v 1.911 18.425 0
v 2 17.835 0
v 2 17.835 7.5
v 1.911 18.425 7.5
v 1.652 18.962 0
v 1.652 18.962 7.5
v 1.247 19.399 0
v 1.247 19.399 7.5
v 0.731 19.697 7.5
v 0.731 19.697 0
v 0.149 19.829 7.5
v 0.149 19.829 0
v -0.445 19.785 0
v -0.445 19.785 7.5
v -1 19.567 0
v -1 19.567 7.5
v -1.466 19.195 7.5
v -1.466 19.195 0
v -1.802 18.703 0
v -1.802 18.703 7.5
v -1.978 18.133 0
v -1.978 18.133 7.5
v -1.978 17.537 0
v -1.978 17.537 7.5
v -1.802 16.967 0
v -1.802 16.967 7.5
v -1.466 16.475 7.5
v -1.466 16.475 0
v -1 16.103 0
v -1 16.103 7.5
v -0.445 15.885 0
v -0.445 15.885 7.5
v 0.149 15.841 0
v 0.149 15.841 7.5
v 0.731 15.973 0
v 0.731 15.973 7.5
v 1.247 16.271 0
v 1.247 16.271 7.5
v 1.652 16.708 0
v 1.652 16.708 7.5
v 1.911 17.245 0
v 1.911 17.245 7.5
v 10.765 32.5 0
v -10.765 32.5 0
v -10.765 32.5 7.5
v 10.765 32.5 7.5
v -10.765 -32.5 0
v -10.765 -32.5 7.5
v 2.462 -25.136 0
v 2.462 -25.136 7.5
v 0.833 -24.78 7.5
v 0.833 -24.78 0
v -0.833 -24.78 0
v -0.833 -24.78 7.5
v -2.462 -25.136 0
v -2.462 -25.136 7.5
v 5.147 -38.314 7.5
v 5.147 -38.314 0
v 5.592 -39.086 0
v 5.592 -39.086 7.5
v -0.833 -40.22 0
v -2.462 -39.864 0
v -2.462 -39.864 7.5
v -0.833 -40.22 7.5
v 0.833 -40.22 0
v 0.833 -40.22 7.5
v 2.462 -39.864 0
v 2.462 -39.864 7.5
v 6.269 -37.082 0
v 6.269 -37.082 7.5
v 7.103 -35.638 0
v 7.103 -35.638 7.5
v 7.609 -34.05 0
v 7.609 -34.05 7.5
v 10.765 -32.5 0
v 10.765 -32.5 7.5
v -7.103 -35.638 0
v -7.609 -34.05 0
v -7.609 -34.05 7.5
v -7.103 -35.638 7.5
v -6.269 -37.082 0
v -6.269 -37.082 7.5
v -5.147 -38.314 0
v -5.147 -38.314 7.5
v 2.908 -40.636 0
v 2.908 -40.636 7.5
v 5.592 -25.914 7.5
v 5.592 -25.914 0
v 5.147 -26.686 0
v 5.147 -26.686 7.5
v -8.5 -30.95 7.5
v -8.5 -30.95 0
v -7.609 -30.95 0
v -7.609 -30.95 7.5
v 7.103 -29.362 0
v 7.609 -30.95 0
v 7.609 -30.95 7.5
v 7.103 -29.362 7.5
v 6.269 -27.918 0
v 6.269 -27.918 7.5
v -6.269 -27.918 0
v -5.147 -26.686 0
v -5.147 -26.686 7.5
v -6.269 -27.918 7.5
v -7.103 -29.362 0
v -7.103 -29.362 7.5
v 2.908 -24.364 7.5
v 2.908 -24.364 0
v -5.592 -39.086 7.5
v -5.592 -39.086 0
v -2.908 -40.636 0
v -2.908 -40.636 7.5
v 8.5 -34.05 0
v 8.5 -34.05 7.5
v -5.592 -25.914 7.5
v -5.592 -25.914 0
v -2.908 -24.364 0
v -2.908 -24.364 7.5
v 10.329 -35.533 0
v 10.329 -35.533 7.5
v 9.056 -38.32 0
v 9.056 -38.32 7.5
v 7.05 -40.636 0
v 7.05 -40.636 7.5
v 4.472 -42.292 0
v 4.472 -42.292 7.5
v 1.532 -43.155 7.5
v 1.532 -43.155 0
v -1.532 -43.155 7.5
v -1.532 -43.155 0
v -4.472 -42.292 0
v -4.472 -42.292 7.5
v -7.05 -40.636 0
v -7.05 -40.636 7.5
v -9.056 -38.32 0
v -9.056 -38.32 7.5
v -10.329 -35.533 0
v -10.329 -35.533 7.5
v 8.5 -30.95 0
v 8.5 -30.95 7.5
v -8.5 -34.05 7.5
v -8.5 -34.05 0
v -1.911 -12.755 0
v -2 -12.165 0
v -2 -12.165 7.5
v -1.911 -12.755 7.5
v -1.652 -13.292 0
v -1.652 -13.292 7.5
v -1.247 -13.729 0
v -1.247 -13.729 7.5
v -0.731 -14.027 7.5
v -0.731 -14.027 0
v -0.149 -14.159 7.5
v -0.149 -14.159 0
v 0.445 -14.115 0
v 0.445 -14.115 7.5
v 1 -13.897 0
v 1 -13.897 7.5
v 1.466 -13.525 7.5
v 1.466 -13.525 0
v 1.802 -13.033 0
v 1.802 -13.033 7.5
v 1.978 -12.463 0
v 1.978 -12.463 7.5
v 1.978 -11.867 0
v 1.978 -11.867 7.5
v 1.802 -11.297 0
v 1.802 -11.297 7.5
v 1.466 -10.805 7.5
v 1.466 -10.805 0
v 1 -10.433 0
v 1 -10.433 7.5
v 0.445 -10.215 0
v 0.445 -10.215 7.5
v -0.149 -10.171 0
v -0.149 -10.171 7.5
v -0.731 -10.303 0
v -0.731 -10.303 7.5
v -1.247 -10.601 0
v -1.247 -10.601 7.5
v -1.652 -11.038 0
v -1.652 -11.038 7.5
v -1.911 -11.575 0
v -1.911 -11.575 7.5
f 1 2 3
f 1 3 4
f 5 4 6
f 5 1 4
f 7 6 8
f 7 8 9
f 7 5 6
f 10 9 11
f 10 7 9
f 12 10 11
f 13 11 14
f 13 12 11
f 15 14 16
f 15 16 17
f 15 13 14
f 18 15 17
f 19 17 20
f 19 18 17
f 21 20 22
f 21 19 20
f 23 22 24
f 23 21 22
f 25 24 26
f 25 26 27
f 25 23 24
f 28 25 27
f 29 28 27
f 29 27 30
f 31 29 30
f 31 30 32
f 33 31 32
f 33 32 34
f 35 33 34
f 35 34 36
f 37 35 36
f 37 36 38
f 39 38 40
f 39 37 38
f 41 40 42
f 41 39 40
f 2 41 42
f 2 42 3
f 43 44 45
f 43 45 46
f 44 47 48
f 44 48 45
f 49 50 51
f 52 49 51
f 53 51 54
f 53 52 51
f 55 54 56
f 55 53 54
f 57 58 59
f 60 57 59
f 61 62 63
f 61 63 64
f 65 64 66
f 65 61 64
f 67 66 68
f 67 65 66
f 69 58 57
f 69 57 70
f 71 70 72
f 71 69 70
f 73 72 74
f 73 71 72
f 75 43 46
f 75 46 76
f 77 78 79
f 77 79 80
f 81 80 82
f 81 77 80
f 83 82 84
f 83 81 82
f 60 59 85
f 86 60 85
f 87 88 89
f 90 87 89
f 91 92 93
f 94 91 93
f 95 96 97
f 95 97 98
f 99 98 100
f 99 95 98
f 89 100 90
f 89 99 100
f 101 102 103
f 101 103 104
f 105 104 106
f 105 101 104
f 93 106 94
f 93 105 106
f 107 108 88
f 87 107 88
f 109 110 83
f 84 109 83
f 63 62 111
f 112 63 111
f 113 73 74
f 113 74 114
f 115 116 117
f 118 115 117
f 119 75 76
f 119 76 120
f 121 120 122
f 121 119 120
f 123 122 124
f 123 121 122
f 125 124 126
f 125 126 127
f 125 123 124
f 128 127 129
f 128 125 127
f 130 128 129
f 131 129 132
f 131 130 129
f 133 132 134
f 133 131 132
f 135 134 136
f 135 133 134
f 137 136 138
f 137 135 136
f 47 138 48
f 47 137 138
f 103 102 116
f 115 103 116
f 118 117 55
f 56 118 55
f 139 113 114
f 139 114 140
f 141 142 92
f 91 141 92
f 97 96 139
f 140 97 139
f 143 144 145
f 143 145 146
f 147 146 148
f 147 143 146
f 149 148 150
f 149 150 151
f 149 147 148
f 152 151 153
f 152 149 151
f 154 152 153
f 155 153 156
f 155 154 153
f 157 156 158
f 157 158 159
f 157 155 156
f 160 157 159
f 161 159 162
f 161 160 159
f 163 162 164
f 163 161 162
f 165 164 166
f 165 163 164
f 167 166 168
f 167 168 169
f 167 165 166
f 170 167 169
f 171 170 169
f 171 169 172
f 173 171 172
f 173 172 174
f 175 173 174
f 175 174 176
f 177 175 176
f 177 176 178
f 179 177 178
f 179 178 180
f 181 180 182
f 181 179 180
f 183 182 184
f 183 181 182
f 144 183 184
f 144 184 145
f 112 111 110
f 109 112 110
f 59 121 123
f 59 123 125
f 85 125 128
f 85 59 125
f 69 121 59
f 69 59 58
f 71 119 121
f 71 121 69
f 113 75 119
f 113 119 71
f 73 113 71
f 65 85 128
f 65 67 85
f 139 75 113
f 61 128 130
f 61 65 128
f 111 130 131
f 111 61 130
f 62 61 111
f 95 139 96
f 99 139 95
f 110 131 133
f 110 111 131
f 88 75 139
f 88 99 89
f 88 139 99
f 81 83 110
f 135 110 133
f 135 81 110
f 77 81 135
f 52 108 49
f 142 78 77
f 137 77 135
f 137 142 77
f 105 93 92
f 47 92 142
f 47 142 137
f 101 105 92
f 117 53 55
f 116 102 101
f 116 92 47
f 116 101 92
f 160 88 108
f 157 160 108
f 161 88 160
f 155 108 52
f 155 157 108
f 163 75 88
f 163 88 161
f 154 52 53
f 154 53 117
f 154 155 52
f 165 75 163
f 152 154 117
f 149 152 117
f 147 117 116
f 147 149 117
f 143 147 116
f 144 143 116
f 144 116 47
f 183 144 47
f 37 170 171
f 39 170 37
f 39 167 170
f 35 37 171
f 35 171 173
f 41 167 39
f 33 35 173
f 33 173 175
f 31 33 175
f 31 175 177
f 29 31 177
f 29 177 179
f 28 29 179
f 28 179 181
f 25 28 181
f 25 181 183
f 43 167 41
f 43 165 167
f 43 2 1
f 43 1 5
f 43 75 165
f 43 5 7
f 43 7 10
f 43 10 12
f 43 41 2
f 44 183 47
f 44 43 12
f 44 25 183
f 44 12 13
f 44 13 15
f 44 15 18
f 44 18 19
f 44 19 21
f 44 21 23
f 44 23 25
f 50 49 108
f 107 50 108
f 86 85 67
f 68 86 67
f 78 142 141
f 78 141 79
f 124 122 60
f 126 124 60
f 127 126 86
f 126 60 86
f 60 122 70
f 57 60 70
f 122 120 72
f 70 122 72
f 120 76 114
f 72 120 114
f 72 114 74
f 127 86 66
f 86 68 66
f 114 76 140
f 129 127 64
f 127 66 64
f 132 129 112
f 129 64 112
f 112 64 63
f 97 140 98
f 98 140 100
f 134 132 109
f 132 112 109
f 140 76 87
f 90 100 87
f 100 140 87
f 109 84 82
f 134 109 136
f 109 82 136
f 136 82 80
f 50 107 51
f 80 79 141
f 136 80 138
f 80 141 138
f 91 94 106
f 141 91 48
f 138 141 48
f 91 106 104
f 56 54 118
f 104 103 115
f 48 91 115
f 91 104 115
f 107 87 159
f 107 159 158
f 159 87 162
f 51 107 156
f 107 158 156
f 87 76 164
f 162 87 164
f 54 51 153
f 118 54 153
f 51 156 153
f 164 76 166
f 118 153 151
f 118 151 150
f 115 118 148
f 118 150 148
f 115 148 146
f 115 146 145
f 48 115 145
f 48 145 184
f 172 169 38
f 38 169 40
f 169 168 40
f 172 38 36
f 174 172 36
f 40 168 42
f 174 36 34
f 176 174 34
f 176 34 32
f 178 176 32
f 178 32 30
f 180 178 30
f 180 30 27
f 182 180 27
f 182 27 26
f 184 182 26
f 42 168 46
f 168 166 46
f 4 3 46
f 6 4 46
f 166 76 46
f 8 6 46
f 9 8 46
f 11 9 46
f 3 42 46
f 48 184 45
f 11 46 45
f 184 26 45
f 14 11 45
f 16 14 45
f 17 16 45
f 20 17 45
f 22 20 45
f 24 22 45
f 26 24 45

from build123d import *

# Parameters (mm, degrees)
SKETCH1_R           = 4.765
SKETCH1_R_2         = 2
BOSS_EXTRUDE1_DEPTH = 7.5
CUT_EXTRUDE1_START  = -7.5
SKETCH3_R           = 7.765
SKETCH3_W           = 17
SKETCH3_H           = 3.1
CUT_EXTRUDE1_DEPTH  = 7.5


with BuildPart() as part:
    # Sketch1 → Boss-Extrude1 (new body)
    with BuildSketch(Plane.XY):
        with BuildLine():
            Line((-10.765, 32.5), (10.765, 32.5))
            Line((10.765, 32.5), (10.765, -32.5))
            ThreePointArc((10.765, -32.5), (0, -43.265), (-10.765, -32.5))
            Line((-10.765, -32.5), (-10.765, 32.5))
        make_face()
        with Locations((0, -32.5)):
            Circle(SKETCH1_R, mode=Mode.SUBTRACT)
        with Locations((0, 17.835)):
            Circle(SKETCH1_R_2, mode=Mode.SUBTRACT)
        with Locations(Location((0, -12.165, 0), (0, 0, 180))):
            Circle(SKETCH1_R_2, mode=Mode.SUBTRACT)
    extrude(amount=BOSS_EXTRUDE1_DEPTH)

    # Sketch3 → Cut-Extrude1 (cut)
    with BuildSketch(Plane.XY.offset(7.5).offset(CUT_EXTRUDE1_START)):
        with Locations((0, -32.5)):
            Circle(SKETCH3_R)
        Polygon((-5.592339376, -25.913784068), (-2.907660624, -24.363784068), (5.592339376, -39.086215932), (2.907660624, -40.636215932), align=None)
        with Locations((0, -32.5)):
            Rectangle(SKETCH3_W, SKETCH3_H)
        Polygon((2.907660624, -24.363784068), (5.592339376, -25.913784068), (-2.907660624, -40.636215932), (-5.592339376, -39.086215932), align=None)
    extrude(amount=CUT_EXTRUDE1_DEPTH, mode=Mode.SUBTRACT)


solid = part.part
